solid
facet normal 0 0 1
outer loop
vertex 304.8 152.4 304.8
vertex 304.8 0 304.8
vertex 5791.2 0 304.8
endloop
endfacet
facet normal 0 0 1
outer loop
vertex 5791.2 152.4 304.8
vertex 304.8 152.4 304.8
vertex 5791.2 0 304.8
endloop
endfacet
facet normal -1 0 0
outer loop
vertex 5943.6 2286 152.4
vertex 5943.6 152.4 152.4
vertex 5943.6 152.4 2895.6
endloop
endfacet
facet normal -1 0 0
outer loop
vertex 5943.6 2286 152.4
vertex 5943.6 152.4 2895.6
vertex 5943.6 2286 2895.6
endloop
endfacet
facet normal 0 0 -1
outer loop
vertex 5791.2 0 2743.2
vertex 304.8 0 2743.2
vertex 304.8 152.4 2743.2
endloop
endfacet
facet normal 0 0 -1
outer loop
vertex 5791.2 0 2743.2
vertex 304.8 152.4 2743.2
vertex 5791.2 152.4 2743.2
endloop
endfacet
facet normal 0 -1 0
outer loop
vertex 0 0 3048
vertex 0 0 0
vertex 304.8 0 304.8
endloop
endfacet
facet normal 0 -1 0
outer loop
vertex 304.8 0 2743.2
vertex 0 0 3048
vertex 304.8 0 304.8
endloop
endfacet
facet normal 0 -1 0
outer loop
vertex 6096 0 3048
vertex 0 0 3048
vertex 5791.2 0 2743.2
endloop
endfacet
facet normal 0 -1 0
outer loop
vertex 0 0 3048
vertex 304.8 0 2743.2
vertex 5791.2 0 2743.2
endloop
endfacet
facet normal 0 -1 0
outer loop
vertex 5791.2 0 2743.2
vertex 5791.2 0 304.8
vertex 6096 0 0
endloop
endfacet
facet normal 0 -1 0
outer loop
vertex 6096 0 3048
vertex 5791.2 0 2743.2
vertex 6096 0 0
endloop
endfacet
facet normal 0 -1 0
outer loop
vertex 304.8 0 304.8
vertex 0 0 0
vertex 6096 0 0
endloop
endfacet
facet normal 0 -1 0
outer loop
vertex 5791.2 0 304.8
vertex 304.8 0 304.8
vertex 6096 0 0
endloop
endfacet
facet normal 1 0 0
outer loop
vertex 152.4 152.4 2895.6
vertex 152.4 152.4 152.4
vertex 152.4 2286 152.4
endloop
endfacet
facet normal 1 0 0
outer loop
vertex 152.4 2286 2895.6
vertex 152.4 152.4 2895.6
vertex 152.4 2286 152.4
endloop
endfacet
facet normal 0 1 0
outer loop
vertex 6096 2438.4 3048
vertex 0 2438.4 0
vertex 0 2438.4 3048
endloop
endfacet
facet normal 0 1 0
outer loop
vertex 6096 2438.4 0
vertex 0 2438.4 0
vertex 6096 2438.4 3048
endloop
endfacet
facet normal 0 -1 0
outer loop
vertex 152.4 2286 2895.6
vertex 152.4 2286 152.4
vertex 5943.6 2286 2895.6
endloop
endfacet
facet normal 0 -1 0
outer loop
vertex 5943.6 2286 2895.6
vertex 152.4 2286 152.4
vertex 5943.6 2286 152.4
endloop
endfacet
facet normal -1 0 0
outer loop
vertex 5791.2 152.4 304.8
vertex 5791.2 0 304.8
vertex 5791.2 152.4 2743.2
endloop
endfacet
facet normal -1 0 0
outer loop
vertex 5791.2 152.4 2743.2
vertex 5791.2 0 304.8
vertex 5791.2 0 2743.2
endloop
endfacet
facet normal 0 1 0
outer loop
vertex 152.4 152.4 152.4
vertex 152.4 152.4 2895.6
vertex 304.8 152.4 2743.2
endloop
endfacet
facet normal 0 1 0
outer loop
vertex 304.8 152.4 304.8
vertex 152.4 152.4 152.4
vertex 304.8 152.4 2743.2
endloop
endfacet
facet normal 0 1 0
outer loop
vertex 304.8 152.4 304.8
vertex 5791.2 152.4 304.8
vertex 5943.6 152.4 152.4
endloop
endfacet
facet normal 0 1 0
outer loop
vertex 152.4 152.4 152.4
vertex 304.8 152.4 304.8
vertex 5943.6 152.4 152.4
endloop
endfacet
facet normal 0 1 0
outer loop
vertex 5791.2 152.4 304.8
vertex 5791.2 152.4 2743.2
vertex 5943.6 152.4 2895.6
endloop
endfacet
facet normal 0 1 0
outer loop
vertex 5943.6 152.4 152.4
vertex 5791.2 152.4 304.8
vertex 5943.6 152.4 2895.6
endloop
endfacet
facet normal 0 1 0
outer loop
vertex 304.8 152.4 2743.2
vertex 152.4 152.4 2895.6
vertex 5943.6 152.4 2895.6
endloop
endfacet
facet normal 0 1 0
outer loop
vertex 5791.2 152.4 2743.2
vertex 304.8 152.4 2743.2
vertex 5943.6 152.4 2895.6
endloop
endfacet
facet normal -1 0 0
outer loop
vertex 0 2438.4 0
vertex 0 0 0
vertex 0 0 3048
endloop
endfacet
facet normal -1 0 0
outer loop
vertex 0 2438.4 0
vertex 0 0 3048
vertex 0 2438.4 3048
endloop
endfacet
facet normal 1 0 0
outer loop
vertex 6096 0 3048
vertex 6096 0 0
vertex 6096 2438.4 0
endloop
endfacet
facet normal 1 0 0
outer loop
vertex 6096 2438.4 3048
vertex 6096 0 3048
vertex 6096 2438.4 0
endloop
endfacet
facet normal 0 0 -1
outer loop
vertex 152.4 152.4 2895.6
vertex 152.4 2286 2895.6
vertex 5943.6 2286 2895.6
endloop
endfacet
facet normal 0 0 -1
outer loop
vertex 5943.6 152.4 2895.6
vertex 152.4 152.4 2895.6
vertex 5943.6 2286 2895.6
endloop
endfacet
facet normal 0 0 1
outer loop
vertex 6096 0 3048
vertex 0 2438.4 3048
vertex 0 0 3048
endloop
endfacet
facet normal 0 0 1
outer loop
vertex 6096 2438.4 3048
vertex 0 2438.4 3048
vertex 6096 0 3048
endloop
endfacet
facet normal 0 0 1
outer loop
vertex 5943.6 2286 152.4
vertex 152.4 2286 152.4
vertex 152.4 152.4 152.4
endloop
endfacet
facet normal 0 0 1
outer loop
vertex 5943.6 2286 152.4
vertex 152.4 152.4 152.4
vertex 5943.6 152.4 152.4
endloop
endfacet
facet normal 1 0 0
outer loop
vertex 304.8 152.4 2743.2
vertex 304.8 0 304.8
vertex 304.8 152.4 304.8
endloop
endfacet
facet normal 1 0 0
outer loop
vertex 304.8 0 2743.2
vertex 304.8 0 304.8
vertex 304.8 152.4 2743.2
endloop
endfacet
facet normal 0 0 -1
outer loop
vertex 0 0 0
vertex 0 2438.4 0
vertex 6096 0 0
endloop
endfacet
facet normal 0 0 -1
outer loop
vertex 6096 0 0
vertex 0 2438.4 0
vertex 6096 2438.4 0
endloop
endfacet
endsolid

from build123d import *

# Parameters (mm, degrees)
F0_W     = 6096
F0_H     = 2438.4
F1_DEPTH = 3048
F3_T     = -152.4
F2_W     = 6096
F2_H     = 3048
F2_W_2   = 5486.4
F2_H_2   = 2438.4
F4_DEPTH = 152.4


with BuildPart() as f1:
    # F0 (on Top) → F1 (new body)
    with BuildSketch(Plane.XY):
        with Locations((3048, 1219.2)):
            Rectangle(F0_W, F0_H)
    extrude(amount=F1_DEPTH)

    # F3
    f3_openings = [f1.faces().sort_by_distance(p)[0] for p in [
        (3048, 0, 1524),
    ]]
    offset(amount=F3_T, openings=f3_openings)

    # F2 (on face) → F4 (join)
    with BuildSketch(Plane.XZ):
        with Locations((3048, 1524)):
            Rectangle(F2_W, F2_H)
        with Locations((3048, 1524)):
            Rectangle(F2_W_2, F2_H_2, mode=Mode.SUBTRACT)
    extrude(amount=-F4_DEPTH)


solid = f1.part
